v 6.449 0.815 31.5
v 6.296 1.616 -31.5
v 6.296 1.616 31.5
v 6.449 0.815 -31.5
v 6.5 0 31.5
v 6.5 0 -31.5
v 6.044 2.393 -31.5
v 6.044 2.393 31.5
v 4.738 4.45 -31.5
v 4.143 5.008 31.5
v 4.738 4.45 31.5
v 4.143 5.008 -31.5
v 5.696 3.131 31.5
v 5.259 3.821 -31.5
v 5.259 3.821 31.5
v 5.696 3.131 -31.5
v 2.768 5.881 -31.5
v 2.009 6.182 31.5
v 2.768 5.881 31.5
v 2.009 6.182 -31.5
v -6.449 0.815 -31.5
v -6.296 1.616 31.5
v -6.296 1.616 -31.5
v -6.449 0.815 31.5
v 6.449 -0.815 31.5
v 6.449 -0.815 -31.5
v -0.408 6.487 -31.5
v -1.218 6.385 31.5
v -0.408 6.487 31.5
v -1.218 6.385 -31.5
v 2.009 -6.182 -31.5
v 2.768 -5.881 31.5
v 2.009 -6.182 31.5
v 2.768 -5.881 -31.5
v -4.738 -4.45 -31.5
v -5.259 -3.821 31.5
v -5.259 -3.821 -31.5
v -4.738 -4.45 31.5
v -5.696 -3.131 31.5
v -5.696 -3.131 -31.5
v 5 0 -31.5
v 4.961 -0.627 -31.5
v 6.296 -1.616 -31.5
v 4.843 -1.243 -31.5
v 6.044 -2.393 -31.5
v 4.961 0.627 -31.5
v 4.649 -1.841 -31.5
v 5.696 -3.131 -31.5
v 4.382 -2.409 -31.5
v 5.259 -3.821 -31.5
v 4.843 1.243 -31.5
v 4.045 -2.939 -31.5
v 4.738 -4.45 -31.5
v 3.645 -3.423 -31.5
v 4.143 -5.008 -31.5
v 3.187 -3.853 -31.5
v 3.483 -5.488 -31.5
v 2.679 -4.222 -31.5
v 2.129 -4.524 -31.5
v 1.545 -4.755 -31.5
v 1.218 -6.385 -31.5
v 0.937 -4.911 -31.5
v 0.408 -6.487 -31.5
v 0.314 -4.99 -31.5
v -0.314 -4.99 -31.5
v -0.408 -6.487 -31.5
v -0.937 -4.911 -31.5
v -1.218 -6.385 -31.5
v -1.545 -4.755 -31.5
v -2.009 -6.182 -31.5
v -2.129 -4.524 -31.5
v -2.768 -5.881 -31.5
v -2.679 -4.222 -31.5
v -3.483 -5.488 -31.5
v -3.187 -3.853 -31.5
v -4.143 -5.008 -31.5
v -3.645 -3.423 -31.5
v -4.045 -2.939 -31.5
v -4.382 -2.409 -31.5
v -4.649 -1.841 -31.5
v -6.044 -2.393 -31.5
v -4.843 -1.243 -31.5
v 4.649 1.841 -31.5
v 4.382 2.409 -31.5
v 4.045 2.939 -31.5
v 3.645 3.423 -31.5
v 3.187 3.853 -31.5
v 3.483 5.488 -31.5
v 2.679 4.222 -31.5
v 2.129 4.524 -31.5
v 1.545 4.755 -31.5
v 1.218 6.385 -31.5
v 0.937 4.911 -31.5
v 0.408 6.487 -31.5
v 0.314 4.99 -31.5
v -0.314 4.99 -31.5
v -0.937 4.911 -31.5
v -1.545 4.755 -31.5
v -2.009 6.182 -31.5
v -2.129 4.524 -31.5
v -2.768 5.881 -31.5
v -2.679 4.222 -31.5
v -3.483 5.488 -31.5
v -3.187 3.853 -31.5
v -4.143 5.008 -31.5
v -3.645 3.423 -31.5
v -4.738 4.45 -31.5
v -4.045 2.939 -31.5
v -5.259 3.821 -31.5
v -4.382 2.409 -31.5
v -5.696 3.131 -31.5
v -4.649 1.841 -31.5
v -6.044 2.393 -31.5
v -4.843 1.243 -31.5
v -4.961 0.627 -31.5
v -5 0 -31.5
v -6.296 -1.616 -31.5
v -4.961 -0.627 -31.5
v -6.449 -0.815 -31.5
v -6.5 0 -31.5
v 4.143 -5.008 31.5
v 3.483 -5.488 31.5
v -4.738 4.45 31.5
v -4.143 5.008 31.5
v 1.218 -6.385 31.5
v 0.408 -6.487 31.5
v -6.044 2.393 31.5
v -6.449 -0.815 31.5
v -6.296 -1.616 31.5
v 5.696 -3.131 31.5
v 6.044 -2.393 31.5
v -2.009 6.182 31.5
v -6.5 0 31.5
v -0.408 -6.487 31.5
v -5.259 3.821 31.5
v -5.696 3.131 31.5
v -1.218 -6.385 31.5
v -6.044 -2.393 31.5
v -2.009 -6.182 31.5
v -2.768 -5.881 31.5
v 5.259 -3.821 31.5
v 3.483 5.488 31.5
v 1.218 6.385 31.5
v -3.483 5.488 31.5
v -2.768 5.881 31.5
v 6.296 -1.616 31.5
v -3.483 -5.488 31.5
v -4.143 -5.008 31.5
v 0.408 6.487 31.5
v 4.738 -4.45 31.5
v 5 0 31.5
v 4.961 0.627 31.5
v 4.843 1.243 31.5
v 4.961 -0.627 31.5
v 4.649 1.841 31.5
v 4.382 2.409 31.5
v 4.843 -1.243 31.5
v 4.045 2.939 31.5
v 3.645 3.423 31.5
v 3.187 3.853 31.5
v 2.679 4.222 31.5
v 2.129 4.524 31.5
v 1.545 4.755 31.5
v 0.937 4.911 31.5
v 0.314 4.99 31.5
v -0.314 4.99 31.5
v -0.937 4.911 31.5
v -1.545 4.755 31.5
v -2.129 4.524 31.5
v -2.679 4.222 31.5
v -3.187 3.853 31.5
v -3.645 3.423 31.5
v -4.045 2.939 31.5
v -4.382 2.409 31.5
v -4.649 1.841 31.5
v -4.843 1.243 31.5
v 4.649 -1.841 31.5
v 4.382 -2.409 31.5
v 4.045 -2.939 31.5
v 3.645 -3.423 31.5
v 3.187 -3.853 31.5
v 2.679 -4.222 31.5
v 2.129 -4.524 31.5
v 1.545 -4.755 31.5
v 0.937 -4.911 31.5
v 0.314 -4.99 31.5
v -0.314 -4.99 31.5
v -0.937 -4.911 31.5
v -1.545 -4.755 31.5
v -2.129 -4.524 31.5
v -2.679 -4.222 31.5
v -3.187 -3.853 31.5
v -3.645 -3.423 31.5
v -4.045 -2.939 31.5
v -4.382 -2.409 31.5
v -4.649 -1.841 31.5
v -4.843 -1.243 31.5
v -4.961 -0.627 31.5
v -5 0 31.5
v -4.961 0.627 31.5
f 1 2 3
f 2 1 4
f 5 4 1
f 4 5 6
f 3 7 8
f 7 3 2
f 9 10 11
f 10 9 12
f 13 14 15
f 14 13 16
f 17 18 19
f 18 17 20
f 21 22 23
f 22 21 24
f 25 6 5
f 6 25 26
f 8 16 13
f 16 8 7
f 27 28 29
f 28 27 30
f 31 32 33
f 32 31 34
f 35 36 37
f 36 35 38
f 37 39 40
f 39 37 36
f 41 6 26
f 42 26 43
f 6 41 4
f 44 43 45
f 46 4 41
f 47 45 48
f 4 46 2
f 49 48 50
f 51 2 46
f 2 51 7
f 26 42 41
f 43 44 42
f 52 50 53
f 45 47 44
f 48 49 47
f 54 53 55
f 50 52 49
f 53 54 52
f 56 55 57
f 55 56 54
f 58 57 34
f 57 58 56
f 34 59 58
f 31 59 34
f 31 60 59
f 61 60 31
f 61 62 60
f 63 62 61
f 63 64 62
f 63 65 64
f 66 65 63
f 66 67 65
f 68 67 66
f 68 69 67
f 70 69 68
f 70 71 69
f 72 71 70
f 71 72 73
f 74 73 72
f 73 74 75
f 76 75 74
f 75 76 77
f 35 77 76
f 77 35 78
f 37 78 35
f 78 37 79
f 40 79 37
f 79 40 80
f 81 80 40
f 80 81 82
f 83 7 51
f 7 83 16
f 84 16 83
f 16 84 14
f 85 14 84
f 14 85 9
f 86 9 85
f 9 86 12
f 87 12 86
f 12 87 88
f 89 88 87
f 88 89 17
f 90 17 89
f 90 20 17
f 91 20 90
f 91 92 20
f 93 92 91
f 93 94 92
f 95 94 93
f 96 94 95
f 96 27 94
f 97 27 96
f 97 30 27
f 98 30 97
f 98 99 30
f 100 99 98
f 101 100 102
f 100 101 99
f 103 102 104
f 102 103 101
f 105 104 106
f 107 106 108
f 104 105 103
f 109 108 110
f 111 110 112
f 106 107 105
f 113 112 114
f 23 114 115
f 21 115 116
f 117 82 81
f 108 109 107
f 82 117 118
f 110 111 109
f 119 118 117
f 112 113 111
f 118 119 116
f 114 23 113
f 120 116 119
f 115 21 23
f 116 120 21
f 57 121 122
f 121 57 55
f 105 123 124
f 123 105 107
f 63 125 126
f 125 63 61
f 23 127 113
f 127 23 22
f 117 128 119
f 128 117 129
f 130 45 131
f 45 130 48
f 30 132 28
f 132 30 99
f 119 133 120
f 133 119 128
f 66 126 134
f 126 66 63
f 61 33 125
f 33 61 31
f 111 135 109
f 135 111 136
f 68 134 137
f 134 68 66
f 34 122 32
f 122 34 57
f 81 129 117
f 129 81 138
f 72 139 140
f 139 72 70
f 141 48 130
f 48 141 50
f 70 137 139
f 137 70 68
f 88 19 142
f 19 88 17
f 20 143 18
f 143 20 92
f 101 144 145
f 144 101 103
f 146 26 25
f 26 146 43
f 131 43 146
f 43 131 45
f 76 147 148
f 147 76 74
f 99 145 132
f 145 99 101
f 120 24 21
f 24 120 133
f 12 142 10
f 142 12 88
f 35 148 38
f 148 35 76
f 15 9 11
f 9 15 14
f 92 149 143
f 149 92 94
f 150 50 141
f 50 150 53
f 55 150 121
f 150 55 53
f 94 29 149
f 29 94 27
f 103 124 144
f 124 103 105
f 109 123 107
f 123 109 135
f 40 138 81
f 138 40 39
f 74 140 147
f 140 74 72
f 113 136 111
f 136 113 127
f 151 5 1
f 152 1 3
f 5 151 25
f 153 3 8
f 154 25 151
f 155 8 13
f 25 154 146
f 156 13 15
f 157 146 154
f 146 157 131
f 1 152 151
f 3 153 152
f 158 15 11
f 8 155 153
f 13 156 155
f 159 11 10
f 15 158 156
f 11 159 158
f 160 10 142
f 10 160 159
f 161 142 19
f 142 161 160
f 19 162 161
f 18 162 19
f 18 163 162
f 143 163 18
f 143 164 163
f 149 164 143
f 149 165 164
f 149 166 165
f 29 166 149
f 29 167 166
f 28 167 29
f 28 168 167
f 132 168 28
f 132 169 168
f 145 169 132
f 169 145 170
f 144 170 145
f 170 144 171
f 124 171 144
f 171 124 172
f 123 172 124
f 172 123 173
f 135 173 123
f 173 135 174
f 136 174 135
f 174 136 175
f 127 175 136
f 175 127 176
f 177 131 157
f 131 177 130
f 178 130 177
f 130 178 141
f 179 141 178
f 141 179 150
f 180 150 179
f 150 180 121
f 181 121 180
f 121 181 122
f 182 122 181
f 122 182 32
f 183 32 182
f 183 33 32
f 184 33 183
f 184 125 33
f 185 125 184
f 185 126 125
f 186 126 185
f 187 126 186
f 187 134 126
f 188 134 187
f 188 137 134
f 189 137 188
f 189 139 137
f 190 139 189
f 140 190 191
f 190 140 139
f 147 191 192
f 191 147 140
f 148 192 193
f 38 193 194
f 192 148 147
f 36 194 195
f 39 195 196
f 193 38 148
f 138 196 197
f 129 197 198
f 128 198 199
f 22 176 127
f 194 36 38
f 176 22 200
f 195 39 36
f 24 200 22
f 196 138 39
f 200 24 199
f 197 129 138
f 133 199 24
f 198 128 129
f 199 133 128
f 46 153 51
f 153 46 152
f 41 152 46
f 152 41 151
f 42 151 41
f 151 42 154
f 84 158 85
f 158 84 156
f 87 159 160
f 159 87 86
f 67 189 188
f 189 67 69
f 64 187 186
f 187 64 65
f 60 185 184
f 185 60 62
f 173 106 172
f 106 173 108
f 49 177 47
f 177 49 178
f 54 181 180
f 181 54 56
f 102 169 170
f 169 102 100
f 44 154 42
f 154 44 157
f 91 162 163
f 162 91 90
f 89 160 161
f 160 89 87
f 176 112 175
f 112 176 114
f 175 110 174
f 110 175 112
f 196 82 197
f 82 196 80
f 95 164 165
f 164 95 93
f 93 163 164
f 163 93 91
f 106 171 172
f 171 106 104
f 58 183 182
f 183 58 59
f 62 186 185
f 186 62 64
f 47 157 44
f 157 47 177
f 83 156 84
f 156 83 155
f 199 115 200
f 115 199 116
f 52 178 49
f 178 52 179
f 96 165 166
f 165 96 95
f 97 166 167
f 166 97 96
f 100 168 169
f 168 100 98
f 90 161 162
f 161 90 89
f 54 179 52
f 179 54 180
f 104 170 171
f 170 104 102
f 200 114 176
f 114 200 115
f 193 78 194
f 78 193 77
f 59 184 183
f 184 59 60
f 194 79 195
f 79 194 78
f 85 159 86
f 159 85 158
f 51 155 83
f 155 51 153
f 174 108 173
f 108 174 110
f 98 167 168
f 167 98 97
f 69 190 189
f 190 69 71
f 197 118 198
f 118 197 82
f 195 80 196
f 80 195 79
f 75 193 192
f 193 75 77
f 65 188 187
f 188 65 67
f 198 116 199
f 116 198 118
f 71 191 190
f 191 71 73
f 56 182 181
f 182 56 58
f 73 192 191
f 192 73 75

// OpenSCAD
$fn = 50;


difference() {
	union() {
		translate(v = [0, 0, -31.5000000000]) {
			cylinder(h = 63, r = 6.5000000000);
		}
	}
	union() {
		translate(v = [0, 0, -100.0000000000]) {
			cylinder(h = 200, r = 5.0000000000);
		}
	}
}
